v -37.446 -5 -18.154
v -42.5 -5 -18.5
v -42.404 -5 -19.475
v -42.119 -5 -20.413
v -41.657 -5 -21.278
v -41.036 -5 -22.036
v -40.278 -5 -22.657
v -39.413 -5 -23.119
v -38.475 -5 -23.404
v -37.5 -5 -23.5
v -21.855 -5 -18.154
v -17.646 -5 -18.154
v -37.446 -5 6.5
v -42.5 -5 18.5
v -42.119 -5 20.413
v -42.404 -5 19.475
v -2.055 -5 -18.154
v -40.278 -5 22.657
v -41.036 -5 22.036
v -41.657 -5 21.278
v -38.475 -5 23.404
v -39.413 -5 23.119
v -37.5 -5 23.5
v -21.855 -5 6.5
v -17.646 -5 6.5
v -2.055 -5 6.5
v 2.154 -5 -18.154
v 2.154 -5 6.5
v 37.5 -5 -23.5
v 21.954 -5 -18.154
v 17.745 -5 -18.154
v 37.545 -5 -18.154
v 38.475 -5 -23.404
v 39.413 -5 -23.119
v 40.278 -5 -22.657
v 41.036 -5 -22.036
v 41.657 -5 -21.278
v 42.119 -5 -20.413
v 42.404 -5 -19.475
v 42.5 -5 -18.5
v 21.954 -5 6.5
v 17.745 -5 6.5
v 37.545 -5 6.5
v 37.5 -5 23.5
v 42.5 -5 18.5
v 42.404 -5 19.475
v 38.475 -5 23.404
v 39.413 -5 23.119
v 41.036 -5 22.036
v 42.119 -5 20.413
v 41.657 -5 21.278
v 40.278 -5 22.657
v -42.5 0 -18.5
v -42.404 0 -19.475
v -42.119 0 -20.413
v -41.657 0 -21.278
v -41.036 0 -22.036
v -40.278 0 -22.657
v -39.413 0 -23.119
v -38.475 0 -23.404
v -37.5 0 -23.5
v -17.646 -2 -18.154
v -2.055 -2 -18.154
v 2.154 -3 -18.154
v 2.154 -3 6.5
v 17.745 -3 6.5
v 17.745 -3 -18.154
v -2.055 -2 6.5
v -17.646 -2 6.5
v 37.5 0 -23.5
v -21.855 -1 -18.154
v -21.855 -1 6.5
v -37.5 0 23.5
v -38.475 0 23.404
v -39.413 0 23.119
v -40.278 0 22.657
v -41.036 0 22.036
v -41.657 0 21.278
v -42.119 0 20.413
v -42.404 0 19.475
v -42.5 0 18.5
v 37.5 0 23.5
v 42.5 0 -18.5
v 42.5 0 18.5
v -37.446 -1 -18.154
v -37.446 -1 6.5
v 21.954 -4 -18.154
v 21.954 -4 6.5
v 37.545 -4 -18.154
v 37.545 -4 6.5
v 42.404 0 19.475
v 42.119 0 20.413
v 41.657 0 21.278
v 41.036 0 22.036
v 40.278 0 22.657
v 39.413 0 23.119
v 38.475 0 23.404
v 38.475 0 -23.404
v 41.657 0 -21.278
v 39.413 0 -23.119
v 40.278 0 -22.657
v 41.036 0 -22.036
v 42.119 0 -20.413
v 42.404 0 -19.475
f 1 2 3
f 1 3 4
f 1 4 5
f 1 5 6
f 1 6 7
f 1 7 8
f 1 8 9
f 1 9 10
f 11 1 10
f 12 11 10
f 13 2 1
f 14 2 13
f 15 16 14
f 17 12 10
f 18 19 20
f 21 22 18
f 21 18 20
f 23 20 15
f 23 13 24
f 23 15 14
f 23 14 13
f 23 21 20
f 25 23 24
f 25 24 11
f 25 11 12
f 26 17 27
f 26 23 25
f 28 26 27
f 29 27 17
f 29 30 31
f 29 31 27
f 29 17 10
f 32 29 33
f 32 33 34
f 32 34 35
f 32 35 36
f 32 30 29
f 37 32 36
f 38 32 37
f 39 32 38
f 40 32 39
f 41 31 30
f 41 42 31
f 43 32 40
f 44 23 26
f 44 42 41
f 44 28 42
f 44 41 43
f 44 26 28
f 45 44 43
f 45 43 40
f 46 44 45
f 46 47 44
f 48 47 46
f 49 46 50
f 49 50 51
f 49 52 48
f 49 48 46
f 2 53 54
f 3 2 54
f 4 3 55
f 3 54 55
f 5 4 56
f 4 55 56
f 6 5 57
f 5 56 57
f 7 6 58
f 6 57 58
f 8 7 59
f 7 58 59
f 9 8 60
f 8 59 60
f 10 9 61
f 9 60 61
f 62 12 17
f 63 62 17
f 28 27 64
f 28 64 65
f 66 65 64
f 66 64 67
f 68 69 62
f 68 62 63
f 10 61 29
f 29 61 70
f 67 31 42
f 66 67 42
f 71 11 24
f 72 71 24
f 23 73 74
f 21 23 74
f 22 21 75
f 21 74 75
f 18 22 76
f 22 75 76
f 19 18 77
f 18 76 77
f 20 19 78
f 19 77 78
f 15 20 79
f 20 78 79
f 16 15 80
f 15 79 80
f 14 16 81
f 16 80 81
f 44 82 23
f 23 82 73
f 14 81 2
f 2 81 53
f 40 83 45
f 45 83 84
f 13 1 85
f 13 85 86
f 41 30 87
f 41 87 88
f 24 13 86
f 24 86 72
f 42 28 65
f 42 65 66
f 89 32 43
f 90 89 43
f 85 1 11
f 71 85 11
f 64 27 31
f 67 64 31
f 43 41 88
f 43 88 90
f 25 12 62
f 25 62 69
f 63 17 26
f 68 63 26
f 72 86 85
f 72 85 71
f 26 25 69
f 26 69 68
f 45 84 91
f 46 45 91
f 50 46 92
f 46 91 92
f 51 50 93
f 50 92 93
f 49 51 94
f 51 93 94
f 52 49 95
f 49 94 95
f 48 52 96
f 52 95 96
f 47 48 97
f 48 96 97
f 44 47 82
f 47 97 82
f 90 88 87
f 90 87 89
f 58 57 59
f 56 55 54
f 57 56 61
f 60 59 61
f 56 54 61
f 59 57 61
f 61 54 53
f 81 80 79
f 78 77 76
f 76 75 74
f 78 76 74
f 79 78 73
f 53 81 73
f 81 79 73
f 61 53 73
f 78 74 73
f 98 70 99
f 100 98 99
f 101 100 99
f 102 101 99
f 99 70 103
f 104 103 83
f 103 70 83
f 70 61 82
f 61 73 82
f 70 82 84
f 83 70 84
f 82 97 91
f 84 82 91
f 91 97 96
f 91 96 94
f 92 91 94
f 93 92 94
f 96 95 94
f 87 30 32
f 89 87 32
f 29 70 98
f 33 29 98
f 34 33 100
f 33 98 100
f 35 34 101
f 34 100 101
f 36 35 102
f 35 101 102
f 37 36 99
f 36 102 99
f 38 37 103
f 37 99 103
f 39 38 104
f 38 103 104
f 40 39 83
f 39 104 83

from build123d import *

# Parameters (mm, degrees)
F1_DEPTH = 5
F2_W     = 15.590731
F2_H     = 24.653931
F3_DEPTH = 4
F4_DEPTH = 3
F5_DEPTH = 2
F6_DEPTH = 1


with BuildPart() as f1:
    # F0 (on Front) → F1 (new body)
    with BuildSketch(Plane.XZ):
        with BuildLine():
            Line((-37.5, -23.5), (37.5, -23.5))
            ThreePointArc((37.5, -23.5), (41.035534, -22.035534), (42.5, -18.5))
            Line((42.5, -18.5), (42.5, 18.5))
            ThreePointArc((42.5, 18.5), (41.035534, 22.035534), (37.5, 23.5))
            Line((37.5, 23.5), (-37.5, 23.5))
            ThreePointArc((-37.5, 23.5), (-41.035534, 22.035534), (-42.5, 18.5))
            Line((-42.5, 18.5), (-42.5, -18.5))
            ThreePointArc((-42.5, -18.5), (-41.035534, -22.035534), (-37.5, -23.5))
        make_face()
    extrude(amount=F1_DEPTH)

    # F2 (on face) → F3 (cut)
    with BuildSketch(Plane.XZ.offset(5)):
        with Locations((-29.650416, -5.826966)):
            Rectangle(F2_W, F2_H)
    extrude(amount=-F3_DEPTH, mode=Mode.SUBTRACT)

    # F2 (on face) → F4 (cut)
    with BuildSketch(Plane.XZ.offset(5)):
        with Locations((-9.850416, -5.826966)):
            Rectangle(F2_W, F2_H)
    extrude(amount=-F4_DEPTH, mode=Mode.SUBTRACT)

    # F2 (on face) → F5 (cut)
    with BuildSketch(Plane.XZ.offset(5)):
        with Locations((9.949583, -5.826966)):
            Rectangle(F2_W, F2_H)
    extrude(amount=-F5_DEPTH, mode=Mode.SUBTRACT)

    # F2 (on face) → F6 (cut)
    with BuildSketch(Plane.XZ.offset(5)):
        with Locations((29.749583, -5.826966)):
            Rectangle(F2_W, F2_H)
    extrude(amount=-F6_DEPTH, mode=Mode.SUBTRACT)


solid = f1.part
